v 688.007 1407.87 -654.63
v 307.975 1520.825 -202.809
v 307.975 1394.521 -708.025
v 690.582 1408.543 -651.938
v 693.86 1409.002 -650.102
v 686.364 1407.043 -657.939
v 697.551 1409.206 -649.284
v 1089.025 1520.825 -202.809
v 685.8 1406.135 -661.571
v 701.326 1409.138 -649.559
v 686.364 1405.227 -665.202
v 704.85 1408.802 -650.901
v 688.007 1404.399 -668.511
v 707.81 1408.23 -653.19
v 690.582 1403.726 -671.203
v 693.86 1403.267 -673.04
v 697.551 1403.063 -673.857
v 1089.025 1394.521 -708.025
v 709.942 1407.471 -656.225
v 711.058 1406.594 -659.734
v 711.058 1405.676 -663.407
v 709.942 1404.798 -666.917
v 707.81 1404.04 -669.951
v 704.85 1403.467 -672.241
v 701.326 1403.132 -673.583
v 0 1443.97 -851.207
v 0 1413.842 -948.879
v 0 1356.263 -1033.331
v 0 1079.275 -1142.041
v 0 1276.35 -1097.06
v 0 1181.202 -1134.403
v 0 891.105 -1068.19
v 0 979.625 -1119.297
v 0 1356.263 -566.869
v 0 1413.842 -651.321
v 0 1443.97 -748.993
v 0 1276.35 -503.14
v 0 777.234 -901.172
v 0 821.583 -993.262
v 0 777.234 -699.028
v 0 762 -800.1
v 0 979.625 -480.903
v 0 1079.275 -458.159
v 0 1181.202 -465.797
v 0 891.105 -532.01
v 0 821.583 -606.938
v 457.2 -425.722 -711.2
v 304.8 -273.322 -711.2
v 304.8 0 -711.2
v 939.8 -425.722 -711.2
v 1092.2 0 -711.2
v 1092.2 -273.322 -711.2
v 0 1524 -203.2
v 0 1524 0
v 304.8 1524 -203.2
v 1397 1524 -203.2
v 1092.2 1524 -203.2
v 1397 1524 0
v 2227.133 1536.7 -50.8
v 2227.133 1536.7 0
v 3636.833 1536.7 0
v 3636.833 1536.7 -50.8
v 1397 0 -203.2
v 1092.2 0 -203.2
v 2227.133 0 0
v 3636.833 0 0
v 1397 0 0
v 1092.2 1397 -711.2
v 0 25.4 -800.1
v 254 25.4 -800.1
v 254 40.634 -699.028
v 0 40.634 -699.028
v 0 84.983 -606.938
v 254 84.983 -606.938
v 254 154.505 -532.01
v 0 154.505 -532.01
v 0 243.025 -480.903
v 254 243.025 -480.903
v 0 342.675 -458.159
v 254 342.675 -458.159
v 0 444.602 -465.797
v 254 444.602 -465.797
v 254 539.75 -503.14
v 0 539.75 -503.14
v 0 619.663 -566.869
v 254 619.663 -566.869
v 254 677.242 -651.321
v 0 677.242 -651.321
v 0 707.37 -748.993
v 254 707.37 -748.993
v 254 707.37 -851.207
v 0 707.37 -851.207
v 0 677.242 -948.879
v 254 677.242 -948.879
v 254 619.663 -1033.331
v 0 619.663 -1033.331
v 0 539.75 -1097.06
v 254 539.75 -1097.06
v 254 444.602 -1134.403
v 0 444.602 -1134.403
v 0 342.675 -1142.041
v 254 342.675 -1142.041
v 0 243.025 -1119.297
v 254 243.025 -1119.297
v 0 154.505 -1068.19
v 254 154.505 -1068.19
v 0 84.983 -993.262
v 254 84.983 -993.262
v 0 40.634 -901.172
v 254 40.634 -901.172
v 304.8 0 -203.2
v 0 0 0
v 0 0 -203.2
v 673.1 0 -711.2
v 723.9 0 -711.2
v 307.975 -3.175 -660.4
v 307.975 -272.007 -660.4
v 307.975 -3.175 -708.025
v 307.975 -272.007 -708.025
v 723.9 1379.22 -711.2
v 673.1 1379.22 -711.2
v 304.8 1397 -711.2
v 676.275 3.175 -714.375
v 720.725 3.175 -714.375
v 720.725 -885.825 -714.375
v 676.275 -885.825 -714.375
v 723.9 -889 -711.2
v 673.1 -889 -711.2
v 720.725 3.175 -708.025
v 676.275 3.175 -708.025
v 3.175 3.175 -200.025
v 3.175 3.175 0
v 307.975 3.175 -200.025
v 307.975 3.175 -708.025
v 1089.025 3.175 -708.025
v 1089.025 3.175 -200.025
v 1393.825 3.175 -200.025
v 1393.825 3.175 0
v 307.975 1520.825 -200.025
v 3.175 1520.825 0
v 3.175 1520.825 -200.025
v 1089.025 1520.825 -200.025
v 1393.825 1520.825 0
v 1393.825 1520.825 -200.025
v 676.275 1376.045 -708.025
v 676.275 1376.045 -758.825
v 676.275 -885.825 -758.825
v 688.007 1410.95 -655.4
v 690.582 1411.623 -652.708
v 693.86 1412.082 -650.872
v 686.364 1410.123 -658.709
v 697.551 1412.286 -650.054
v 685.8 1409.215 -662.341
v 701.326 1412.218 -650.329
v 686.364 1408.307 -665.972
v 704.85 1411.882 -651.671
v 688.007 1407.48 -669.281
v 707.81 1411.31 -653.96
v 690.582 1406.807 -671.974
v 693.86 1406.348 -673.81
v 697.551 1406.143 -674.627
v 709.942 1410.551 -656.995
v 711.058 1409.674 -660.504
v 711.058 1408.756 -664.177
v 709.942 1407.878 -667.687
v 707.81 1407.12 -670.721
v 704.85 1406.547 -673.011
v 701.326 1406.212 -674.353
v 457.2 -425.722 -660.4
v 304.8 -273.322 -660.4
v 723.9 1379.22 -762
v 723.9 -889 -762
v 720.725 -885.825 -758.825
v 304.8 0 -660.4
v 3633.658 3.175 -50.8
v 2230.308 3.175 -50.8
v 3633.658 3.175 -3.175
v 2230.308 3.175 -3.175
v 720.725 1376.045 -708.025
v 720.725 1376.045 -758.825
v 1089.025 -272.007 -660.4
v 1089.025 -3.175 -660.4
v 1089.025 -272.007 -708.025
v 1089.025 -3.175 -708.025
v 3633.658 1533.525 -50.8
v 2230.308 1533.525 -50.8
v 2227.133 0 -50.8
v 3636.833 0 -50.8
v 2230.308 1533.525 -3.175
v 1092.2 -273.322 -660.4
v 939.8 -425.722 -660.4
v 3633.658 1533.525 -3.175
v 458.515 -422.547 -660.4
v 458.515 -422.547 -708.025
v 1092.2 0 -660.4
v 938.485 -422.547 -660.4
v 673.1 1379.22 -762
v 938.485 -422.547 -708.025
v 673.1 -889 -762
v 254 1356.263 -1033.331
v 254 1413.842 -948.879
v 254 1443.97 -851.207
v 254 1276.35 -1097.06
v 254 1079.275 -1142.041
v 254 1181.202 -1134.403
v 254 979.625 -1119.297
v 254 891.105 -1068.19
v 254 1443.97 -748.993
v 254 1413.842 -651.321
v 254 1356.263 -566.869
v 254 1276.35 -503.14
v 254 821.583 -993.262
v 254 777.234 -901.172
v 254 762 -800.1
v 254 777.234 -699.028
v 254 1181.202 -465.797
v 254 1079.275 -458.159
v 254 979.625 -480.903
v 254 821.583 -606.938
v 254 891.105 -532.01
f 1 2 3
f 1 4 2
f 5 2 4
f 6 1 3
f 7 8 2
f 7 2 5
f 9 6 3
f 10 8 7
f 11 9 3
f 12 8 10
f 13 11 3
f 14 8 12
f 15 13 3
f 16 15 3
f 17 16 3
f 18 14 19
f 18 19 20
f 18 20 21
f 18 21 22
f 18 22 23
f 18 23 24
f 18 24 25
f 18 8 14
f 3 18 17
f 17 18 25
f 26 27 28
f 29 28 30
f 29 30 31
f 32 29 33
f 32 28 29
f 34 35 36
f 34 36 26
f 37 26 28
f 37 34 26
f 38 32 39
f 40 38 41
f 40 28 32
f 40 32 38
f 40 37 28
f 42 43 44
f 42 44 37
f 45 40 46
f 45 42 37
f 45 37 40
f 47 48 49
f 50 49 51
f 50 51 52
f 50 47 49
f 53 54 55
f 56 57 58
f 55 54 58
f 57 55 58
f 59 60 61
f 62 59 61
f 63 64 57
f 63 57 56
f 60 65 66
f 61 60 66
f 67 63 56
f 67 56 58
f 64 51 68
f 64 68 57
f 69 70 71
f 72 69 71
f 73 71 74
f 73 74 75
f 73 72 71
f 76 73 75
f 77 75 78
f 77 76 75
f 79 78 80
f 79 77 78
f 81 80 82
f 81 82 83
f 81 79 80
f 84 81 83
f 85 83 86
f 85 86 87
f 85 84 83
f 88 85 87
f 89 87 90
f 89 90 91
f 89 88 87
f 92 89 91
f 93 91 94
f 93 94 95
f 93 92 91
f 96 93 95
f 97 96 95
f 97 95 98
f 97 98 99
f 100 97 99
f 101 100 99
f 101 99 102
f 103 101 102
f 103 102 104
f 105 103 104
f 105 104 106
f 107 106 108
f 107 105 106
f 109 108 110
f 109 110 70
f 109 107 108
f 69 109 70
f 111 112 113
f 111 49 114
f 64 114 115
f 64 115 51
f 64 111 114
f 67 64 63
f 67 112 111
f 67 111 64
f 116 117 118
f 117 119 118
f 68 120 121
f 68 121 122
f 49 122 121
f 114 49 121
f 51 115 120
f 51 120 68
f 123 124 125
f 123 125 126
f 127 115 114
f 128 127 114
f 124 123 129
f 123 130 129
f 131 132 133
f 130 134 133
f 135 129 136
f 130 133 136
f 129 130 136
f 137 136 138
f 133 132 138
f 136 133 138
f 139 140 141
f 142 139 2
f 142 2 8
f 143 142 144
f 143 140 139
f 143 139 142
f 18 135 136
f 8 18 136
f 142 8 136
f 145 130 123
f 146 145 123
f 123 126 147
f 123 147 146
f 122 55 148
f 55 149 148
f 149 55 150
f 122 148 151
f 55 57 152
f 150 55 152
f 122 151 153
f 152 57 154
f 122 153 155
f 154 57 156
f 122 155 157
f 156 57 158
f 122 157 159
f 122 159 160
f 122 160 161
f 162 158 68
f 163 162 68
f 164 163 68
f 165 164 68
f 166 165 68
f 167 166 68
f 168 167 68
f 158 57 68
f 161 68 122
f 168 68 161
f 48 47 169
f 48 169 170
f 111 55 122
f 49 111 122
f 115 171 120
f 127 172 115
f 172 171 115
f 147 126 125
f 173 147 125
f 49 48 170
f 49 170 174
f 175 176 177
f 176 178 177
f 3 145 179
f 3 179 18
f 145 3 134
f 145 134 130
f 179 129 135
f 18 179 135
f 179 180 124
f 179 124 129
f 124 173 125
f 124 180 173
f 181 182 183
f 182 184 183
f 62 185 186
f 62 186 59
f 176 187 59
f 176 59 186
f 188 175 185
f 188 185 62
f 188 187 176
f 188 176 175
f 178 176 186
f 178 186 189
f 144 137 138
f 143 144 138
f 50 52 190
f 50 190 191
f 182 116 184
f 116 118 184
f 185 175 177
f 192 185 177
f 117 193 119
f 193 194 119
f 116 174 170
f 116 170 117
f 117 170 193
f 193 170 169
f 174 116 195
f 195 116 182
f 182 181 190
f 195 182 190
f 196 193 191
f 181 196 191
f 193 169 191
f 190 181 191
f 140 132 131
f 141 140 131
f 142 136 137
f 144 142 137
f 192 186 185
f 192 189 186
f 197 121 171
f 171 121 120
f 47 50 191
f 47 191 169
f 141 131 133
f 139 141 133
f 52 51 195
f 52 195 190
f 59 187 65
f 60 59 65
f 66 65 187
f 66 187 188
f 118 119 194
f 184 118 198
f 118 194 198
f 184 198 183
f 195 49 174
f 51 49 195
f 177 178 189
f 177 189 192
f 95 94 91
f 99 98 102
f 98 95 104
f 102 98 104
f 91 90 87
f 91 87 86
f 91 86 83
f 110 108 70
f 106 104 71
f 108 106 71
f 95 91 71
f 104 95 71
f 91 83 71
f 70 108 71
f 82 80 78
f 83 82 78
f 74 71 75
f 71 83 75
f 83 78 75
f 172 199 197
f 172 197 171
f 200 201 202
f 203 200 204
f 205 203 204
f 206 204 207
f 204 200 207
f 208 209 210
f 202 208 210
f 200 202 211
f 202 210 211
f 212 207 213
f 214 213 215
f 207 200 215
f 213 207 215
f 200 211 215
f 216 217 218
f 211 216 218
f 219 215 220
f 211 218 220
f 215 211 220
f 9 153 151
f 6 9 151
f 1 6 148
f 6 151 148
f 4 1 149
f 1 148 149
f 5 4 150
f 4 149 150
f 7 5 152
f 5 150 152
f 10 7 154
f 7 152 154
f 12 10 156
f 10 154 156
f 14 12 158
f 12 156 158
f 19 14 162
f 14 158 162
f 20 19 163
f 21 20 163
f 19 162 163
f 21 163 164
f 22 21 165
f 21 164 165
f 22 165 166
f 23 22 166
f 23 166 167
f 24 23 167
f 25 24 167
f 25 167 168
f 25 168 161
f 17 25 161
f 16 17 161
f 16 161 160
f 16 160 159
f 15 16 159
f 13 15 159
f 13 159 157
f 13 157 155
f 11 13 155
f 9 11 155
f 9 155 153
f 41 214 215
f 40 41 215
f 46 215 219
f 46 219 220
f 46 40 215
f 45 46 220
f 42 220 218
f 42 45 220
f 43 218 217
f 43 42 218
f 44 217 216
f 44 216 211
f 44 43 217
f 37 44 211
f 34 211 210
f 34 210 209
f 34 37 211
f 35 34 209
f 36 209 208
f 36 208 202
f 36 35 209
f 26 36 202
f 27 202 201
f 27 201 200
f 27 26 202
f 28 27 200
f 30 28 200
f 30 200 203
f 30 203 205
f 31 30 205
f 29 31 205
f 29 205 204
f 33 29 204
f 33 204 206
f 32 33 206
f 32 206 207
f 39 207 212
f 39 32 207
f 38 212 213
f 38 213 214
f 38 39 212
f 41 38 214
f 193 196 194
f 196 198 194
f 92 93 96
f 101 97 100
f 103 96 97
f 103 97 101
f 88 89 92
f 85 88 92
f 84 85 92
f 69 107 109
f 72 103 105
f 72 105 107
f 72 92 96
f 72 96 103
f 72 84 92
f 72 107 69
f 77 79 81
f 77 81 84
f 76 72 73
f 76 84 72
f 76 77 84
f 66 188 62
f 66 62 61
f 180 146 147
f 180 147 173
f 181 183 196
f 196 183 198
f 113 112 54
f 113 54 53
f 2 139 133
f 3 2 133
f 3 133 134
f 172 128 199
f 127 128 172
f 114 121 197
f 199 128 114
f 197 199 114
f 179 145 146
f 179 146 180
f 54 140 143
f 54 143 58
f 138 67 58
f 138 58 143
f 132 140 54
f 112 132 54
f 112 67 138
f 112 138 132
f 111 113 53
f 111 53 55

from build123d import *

# Parameters (mm, degrees)
F1_DEPTH      = 1524
F3_DEPTH      = 1092.201
F5_DEPTH      = 889
F5_DEPTH_BACK = 1379.22
F6_R          = 342.9
F7_DEPTH      = 254
F9_DEPTH      = 50.8
F10_T         = -3.175
F11_T         = -3.175
F12_R         = 12.7
F13_DEPTH     = 25.4
F14_W         = 1409.7
F14_H         = 50.8
F15_DEPTH     = 1536.7
F16_T         = -3.175


with BuildPart() as f1:
    # F0 (on Front) → F1 (new body)
    with BuildSketch(Plane.XZ):
        Polygon((1397, 0), (0, 0), (0, -203.2), (304.8, -203.2), (304.8, -711.2), (1092.2, -711.2), (1092.2, -203.2), (1397, -203.2), align=None)
    extrude(amount=-F1_DEPTH)

    # F2 (on face) → F3 (cut, through all)
    with BuildSketch(Plane.YZ.offset(1092.2)):
        Polygon((1524, -711.2), (1524, -203.2), (1397, -711.2), align=None)
    extrude(amount=-F3_DEPTH, mode=Mode.SUBTRACT)

    # F4 (on face) → F5 (join, two sides)
    with BuildSketch(Plane.XZ) as f5_sk:
        Polygon((723.9, -711.2), (698.5, -711.2), (673.1, -711.2), (673.1, -762), (723.9, -762), align=None)
    extrude(amount=F5_DEPTH)
    extrude(f5_sk.sketch, amount=-F5_DEPTH_BACK)

    # F11
    f11_openings = [f1.faces().sort_by_distance(p)[0] for p in [
        (698.5, 762, 0),
    ]]
    offset(amount=F11_T, openings=f11_openings, kind=Kind.INTERSECTION)

    # F12 (on face) → F13 (cut)
    with BuildSketch(Plane(origin=(0, 1482.1647058824, -370.5411764706), x_dir=(-1, 0, 0), z_dir=(0, 0.9701425001, -0.242535625))):
        with Locations((-698.5, -300.7801175117)):
            Circle(F12_R)
    extrude(amount=-F13_DEPTH, mode=Mode.SUBTRACT)


with BuildPart() as f7:
    # F6 (on face) → F7 (new body)
    with BuildSketch(Plane(origin=(0, 0, 0), x_dir=(0, -1, 0), z_dir=(-1, 0, 0))):
        with Locations((-1104.9, -800.1)):
            Circle(F6_R)
    extrude(amount=-F7_DEPTH)


with BuildPart() as f7b:
    # F6 (on face) → F7, piece 2 (new body)
    with BuildSketch(Plane(origin=(0, 0, 0), x_dir=(0, -1, 0), z_dir=(-1, 0, 0))):
        with Locations((-368.3, -800.1)):
            Circle(F6_R)
    extrude(amount=-F7_DEPTH)


with BuildPart() as f9:
    # F8 (on face) → F9 (new body)
    with BuildSketch(Plane(origin=(0, 0, -711.2), x_dir=(1, 0, 0), z_dir=(0, 0, -1))):
        Polygon((304.8, 273.322181797), (304.8, 0), (673.1, 0), (723.9, 0), (1092.2, 0), (1092.2, 273.322181797), (939.8, 425.722181797), (457.2, 425.722181797), align=None)
    extrude(amount=-F9_DEPTH)

    # F10
    f10_openings = [f9.faces().sort_by_distance(p)[0] for p in [
        (698.5, -200.796546, -660.4),
    ]]
    offset(amount=F10_T, openings=f10_openings)


with BuildPart() as f15:
    # F14 (on face) → F15 (new body)
    with BuildSketch(Plane.XZ):
        with Locations((2931.9826007332, -25.4)):
            Rectangle(F14_W, F14_H)
    extrude(amount=-F15_DEPTH)

    # F16
    f16_openings = [f15.faces().sort_by_distance(p)[0] for p in [
        (2931.982601, 768.35, -50.8),
    ]]
    offset(amount=F16_T, openings=f16_openings)


solid = Compound([f1.part, f7.part, f7b.part, f9.part, f15.part])
